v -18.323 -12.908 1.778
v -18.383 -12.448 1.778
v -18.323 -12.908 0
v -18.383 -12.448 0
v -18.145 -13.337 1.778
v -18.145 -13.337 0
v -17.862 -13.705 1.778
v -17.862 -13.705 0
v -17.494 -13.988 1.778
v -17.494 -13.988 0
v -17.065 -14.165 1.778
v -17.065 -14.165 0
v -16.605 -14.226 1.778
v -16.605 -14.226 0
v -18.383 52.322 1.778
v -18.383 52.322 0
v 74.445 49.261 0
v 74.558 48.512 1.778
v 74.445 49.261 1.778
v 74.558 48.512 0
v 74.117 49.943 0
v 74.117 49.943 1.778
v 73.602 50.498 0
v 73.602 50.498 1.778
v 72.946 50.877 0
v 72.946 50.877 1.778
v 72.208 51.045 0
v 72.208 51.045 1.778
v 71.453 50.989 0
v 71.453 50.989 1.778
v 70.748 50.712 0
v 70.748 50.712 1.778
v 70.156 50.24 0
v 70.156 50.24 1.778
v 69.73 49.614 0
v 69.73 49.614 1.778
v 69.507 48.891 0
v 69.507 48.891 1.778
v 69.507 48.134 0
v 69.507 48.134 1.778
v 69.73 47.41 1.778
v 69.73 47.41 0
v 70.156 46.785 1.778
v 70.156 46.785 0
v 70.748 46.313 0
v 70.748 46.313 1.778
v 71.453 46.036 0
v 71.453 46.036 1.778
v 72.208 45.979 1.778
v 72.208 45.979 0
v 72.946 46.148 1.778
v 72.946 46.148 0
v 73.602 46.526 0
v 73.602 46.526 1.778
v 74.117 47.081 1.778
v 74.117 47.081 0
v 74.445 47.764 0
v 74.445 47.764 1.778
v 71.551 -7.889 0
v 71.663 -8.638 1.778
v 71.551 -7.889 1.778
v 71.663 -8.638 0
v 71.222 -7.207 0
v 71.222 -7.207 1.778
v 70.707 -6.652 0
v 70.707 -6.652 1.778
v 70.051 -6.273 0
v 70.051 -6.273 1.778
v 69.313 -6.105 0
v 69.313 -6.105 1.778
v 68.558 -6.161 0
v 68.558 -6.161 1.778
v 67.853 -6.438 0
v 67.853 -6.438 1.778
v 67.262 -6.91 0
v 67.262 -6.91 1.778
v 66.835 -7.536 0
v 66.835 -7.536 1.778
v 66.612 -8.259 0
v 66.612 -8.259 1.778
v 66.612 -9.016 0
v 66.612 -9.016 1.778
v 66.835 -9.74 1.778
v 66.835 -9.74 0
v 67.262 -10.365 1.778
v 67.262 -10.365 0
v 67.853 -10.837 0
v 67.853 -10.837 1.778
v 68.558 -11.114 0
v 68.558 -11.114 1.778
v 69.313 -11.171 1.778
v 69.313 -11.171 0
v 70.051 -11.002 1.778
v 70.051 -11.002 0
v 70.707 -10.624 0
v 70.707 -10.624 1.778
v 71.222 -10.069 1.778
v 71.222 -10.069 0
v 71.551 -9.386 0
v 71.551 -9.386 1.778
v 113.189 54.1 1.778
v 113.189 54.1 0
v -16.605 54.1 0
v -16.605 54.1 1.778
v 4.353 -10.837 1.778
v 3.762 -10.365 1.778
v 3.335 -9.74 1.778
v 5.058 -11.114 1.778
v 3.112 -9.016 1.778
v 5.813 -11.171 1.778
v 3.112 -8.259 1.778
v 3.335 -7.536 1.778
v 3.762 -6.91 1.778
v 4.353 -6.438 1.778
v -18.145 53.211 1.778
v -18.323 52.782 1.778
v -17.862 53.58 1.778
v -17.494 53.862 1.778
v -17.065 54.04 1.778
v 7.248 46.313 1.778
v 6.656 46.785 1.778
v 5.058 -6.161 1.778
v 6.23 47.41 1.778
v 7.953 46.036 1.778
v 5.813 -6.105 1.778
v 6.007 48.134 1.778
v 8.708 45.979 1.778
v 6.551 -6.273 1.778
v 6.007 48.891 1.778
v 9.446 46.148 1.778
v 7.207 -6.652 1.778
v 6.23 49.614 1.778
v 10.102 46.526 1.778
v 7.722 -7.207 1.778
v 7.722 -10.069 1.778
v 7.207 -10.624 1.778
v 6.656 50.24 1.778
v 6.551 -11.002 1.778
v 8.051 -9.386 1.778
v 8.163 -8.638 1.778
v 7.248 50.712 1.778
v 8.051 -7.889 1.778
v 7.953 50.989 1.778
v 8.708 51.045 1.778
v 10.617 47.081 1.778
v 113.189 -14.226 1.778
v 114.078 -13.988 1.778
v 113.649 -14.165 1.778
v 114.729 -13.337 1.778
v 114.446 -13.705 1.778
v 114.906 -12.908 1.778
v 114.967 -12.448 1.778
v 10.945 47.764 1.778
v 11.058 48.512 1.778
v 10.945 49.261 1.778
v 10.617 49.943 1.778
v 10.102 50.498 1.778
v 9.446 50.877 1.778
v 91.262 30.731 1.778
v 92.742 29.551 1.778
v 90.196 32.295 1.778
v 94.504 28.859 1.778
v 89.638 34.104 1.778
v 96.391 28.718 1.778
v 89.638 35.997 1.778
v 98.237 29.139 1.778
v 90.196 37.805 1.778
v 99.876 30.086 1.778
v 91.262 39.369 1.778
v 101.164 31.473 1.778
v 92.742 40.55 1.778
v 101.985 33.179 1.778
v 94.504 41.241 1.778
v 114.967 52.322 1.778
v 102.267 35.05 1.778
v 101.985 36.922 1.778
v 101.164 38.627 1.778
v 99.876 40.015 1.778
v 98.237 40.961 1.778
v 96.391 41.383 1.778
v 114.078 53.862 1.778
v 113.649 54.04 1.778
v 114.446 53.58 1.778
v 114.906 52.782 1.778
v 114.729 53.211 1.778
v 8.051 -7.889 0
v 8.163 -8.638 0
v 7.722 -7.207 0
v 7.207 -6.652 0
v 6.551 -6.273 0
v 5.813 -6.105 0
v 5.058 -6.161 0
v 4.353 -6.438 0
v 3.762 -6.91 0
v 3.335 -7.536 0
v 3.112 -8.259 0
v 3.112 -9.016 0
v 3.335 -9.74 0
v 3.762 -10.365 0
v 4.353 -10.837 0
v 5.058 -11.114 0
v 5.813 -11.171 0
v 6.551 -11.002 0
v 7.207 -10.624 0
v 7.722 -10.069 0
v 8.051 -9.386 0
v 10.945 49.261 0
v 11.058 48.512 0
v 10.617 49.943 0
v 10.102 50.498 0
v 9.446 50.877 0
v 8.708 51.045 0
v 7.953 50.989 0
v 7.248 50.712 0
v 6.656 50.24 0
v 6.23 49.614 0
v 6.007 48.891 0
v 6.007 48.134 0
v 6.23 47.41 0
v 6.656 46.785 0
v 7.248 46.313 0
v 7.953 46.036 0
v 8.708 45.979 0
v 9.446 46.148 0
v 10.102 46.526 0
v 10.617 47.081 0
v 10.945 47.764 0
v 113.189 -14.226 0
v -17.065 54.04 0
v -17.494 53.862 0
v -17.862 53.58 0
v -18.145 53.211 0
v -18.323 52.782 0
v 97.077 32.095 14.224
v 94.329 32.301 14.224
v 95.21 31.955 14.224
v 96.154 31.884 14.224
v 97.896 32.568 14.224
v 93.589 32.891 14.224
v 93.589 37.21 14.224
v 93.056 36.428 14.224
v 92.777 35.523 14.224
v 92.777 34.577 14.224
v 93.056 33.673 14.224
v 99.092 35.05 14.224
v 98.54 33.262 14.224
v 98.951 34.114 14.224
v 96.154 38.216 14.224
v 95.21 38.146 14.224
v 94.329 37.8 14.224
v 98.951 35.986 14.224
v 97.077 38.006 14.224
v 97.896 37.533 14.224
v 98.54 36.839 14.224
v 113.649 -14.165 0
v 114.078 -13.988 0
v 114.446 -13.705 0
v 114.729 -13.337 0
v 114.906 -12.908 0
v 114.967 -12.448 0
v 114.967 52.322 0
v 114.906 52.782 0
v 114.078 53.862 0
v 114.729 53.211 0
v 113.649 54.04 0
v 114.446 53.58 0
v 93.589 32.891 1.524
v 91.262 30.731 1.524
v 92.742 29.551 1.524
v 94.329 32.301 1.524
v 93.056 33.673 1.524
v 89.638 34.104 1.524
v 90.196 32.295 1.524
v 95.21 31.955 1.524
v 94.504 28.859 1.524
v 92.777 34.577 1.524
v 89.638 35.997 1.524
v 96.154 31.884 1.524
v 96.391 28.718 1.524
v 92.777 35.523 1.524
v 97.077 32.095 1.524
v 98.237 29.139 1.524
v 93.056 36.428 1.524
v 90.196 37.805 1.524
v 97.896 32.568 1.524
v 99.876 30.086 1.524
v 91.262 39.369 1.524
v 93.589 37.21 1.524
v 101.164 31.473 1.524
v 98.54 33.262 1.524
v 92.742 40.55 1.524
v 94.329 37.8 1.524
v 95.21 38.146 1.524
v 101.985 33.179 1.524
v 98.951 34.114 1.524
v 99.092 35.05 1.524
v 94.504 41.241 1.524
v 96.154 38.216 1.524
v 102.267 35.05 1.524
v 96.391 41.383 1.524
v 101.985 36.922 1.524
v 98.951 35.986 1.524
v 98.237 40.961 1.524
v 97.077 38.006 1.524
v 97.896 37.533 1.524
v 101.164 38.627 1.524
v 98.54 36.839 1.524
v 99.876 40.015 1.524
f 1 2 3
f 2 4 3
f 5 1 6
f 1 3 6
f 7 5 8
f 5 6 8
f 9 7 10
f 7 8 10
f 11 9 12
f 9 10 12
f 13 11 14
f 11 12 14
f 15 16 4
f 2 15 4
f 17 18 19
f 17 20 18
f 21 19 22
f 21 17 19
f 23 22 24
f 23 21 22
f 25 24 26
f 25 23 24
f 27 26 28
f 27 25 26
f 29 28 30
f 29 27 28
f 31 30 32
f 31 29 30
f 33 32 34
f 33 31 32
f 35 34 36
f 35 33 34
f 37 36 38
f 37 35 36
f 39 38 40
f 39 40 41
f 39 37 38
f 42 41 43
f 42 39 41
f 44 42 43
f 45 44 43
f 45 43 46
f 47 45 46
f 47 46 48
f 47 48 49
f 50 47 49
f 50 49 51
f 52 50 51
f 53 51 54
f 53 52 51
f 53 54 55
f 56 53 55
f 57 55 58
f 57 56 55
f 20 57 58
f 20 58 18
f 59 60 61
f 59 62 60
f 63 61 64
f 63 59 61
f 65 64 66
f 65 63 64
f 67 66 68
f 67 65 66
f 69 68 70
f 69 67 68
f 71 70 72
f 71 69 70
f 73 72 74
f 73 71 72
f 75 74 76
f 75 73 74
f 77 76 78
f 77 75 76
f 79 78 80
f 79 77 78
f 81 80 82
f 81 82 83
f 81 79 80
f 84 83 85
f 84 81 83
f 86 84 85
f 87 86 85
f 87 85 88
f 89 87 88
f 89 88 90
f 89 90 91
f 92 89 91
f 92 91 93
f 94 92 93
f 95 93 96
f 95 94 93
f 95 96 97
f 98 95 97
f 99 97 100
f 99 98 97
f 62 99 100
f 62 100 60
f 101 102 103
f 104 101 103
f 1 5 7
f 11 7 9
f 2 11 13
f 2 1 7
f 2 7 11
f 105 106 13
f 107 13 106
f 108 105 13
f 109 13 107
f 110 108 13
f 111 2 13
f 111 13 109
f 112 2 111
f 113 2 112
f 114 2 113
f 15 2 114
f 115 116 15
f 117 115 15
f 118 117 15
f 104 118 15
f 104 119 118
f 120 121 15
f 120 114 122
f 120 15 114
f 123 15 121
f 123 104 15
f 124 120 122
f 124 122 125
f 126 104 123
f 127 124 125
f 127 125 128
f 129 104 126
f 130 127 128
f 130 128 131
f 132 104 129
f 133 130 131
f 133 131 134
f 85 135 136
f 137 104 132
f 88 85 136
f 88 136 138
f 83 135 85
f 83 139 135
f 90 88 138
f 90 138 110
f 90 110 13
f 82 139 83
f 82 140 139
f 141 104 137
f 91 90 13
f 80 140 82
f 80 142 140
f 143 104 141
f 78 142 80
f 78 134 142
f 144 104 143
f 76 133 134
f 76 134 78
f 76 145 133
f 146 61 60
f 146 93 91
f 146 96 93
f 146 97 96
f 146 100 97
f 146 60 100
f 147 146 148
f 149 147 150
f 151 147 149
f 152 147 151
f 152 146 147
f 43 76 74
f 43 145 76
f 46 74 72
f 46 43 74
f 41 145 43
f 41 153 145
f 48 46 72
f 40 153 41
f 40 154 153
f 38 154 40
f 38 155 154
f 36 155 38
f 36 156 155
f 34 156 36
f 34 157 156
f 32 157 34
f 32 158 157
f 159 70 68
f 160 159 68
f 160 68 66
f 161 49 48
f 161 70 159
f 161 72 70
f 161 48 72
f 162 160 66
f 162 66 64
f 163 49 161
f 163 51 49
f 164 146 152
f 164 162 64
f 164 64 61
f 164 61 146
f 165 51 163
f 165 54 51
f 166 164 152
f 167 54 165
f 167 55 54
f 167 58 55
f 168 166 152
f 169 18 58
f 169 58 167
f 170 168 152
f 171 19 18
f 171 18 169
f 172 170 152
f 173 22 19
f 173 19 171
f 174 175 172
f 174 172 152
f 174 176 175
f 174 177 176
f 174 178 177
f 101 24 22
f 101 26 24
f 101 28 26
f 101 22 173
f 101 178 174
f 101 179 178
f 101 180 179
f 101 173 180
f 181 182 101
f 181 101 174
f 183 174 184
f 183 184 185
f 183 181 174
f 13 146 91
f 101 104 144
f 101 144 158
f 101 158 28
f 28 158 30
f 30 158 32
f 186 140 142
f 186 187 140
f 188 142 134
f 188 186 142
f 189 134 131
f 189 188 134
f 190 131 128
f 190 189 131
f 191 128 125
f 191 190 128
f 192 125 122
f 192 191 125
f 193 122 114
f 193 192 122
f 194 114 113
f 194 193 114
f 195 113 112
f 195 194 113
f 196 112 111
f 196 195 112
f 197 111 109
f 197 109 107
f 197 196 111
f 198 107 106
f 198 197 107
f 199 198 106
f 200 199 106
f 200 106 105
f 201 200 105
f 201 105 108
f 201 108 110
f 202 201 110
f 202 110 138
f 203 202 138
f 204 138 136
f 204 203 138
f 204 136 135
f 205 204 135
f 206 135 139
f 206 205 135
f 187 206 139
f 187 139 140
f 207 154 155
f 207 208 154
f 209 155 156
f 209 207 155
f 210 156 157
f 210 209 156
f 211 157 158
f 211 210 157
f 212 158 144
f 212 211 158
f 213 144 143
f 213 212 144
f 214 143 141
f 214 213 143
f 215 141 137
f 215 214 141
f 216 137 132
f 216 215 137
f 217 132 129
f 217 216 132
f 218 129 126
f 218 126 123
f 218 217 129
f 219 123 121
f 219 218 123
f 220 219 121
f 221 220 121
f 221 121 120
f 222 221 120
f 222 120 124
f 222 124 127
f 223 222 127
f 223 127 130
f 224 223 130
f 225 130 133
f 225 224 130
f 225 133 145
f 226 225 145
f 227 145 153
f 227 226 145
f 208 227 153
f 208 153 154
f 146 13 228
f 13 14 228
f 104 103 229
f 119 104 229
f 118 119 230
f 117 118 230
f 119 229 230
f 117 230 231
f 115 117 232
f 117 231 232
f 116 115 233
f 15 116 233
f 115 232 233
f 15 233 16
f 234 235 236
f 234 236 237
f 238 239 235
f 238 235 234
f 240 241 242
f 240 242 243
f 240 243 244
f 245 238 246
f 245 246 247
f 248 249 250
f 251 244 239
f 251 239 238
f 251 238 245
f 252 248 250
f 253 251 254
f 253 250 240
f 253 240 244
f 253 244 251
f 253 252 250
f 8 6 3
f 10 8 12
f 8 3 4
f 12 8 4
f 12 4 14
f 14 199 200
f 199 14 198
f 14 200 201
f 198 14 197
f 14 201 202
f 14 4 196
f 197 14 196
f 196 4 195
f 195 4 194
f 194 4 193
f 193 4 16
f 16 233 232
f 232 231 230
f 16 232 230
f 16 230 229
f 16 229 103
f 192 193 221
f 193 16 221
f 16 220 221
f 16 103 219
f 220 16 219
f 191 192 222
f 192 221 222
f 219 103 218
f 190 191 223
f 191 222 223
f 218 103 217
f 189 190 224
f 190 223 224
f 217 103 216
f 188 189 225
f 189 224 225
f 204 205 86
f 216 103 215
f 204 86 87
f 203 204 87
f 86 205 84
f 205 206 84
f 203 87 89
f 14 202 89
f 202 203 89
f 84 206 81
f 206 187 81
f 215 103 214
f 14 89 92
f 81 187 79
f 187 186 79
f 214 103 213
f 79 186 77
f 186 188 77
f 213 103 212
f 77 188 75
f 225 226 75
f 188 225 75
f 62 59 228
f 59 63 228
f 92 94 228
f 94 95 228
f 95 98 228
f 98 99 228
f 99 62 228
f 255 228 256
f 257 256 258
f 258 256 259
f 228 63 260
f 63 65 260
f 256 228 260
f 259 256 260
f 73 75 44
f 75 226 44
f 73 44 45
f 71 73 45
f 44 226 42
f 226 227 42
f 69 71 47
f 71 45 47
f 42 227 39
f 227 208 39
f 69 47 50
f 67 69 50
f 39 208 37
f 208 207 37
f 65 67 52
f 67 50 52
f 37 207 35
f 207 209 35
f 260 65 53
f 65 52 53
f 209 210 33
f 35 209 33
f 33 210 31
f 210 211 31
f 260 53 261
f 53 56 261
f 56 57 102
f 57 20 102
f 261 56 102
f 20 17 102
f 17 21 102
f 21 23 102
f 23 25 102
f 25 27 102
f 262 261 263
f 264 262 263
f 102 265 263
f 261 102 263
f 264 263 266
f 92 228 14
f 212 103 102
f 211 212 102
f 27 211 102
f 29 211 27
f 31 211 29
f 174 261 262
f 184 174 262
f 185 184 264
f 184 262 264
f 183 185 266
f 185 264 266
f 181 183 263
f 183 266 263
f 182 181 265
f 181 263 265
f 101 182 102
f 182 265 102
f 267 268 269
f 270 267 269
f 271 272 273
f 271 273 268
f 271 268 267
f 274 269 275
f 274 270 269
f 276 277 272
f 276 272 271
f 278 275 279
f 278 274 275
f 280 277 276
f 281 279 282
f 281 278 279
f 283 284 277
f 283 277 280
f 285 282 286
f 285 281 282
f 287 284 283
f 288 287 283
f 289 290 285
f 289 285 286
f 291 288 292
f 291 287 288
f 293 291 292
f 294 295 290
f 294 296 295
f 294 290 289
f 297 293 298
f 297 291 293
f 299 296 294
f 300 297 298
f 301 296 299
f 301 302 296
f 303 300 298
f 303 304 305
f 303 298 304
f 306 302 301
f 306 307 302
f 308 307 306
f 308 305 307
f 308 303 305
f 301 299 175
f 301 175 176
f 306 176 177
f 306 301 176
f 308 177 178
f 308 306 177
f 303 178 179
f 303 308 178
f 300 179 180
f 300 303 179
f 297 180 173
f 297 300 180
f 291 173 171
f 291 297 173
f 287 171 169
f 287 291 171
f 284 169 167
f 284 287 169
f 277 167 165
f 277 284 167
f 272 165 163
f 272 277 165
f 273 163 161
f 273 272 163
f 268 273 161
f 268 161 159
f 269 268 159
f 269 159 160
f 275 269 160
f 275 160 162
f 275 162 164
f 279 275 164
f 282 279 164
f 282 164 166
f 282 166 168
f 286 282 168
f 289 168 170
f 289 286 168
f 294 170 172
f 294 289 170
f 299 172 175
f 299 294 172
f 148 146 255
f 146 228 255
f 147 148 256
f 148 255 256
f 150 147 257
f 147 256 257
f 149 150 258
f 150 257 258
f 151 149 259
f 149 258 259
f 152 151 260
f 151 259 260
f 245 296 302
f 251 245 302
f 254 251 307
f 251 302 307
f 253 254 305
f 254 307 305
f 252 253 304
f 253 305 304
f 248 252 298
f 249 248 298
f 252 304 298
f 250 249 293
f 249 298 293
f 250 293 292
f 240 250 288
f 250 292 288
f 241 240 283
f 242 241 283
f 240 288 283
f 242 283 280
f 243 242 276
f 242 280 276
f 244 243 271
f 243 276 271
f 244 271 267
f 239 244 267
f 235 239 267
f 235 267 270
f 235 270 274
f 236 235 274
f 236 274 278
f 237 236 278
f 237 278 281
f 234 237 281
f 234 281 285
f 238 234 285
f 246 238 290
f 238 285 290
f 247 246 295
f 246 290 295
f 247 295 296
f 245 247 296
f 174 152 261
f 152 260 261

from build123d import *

# Parameters (mm, degrees)
F0_R     = 2.54
F1_DEPTH = 1.524
F2_R     = 2.54
F2_R_2   = 6.35
F3_DEPTH = 0.254
F4_R     = 3.175
F5_DEPTH = 12.7


with BuildPart() as f1:
    # F0 (on Top) → F1 (new body)
    with BuildSketch(Plane.XY):
        with BuildLine():
            ThreePointArc((-18.383103, -12.44771), (-17.862339, -13.704946), (-16.605103, -14.22571))
            Line((-16.605103, -14.22571), (113.188897, -14.22571))
            ThreePointArc((113.188897, -14.22571), (114.446133, -13.704946), (114.966897, -12.44771))
            Line((114.966897, -12.44771), (114.966897, 52.32229))
            ThreePointArc((114.966897, 52.32229), (114.446133, 53.579526), (113.188897, 54.10029))
            Line((113.188897, 54.10029), (-16.605103, 54.10029))
            ThreePointArc((-16.605103, 54.10029), (-17.862339, 53.579526), (-18.383103, 52.32229))
            Line((-18.383103, 52.32229), (-18.383103, -12.44771))
        make_face()
        with Locations((5.623456, -8.63771)):
            Circle(F0_R, mode=Mode.SUBTRACT)
        with Locations((69.123456, -8.63771)):
            Circle(F0_R, mode=Mode.SUBTRACT)
        with Locations((8.518225, 48.51229)):
            Circle(F0_R, mode=Mode.SUBTRACT)
        with Locations((72.018225, 48.51229)):
            Circle(F0_R, mode=Mode.SUBTRACT)
    extrude(amount=F1_DEPTH)

    # F2 (on face) → F3 (join)
    with BuildSketch(Plane.XY.offset(1.524)):
        with BuildLine():
            Line((-18.383103, 52.32229), (-18.383103, -12.44771))
            ThreePointArc((-18.383103, -12.44771), (-17.862339, -13.704946), (-16.605103, -14.22571))
            Line((-16.605103, -14.22571), (113.188897, -14.22571))
            ThreePointArc((113.188897, -14.22571), (114.446133, -13.704946), (114.966897, -12.44771))
            Line((114.966897, -12.44771), (114.966897, 52.32229))
            ThreePointArc((114.966897, 52.32229), (114.446133, 53.579526), (113.188897, 54.10029))
            Line((113.188897, 54.10029), (-16.605103, 54.10029))
            ThreePointArc((-16.605103, 54.10029), (-17.862339, 53.579526), (-18.383103, 52.32229))
        make_face()
        with Locations((5.623456, -8.63771)):
            Circle(F2_R, mode=Mode.SUBTRACT)
        with Locations((69.123456, -8.63771)):
            Circle(F2_R, mode=Mode.SUBTRACT)
        with Locations((8.518225, 48.51229)):
            Circle(F2_R, mode=Mode.SUBTRACT)
        with Locations((95.916897, 35.05029)):
            Circle(F2_R_2, mode=Mode.SUBTRACT)
        with Locations((72.018225, 48.51229)):
            Circle(F2_R, mode=Mode.SUBTRACT)
    extrude(amount=F3_DEPTH)

    # F4 (on face) → F5 (join)
    with BuildSketch(Plane.XY.offset(1.524)):
        with Locations((95.916897, 35.05029)):
            Circle(F4_R)
    extrude(amount=F5_DEPTH)


solid = f1.part
